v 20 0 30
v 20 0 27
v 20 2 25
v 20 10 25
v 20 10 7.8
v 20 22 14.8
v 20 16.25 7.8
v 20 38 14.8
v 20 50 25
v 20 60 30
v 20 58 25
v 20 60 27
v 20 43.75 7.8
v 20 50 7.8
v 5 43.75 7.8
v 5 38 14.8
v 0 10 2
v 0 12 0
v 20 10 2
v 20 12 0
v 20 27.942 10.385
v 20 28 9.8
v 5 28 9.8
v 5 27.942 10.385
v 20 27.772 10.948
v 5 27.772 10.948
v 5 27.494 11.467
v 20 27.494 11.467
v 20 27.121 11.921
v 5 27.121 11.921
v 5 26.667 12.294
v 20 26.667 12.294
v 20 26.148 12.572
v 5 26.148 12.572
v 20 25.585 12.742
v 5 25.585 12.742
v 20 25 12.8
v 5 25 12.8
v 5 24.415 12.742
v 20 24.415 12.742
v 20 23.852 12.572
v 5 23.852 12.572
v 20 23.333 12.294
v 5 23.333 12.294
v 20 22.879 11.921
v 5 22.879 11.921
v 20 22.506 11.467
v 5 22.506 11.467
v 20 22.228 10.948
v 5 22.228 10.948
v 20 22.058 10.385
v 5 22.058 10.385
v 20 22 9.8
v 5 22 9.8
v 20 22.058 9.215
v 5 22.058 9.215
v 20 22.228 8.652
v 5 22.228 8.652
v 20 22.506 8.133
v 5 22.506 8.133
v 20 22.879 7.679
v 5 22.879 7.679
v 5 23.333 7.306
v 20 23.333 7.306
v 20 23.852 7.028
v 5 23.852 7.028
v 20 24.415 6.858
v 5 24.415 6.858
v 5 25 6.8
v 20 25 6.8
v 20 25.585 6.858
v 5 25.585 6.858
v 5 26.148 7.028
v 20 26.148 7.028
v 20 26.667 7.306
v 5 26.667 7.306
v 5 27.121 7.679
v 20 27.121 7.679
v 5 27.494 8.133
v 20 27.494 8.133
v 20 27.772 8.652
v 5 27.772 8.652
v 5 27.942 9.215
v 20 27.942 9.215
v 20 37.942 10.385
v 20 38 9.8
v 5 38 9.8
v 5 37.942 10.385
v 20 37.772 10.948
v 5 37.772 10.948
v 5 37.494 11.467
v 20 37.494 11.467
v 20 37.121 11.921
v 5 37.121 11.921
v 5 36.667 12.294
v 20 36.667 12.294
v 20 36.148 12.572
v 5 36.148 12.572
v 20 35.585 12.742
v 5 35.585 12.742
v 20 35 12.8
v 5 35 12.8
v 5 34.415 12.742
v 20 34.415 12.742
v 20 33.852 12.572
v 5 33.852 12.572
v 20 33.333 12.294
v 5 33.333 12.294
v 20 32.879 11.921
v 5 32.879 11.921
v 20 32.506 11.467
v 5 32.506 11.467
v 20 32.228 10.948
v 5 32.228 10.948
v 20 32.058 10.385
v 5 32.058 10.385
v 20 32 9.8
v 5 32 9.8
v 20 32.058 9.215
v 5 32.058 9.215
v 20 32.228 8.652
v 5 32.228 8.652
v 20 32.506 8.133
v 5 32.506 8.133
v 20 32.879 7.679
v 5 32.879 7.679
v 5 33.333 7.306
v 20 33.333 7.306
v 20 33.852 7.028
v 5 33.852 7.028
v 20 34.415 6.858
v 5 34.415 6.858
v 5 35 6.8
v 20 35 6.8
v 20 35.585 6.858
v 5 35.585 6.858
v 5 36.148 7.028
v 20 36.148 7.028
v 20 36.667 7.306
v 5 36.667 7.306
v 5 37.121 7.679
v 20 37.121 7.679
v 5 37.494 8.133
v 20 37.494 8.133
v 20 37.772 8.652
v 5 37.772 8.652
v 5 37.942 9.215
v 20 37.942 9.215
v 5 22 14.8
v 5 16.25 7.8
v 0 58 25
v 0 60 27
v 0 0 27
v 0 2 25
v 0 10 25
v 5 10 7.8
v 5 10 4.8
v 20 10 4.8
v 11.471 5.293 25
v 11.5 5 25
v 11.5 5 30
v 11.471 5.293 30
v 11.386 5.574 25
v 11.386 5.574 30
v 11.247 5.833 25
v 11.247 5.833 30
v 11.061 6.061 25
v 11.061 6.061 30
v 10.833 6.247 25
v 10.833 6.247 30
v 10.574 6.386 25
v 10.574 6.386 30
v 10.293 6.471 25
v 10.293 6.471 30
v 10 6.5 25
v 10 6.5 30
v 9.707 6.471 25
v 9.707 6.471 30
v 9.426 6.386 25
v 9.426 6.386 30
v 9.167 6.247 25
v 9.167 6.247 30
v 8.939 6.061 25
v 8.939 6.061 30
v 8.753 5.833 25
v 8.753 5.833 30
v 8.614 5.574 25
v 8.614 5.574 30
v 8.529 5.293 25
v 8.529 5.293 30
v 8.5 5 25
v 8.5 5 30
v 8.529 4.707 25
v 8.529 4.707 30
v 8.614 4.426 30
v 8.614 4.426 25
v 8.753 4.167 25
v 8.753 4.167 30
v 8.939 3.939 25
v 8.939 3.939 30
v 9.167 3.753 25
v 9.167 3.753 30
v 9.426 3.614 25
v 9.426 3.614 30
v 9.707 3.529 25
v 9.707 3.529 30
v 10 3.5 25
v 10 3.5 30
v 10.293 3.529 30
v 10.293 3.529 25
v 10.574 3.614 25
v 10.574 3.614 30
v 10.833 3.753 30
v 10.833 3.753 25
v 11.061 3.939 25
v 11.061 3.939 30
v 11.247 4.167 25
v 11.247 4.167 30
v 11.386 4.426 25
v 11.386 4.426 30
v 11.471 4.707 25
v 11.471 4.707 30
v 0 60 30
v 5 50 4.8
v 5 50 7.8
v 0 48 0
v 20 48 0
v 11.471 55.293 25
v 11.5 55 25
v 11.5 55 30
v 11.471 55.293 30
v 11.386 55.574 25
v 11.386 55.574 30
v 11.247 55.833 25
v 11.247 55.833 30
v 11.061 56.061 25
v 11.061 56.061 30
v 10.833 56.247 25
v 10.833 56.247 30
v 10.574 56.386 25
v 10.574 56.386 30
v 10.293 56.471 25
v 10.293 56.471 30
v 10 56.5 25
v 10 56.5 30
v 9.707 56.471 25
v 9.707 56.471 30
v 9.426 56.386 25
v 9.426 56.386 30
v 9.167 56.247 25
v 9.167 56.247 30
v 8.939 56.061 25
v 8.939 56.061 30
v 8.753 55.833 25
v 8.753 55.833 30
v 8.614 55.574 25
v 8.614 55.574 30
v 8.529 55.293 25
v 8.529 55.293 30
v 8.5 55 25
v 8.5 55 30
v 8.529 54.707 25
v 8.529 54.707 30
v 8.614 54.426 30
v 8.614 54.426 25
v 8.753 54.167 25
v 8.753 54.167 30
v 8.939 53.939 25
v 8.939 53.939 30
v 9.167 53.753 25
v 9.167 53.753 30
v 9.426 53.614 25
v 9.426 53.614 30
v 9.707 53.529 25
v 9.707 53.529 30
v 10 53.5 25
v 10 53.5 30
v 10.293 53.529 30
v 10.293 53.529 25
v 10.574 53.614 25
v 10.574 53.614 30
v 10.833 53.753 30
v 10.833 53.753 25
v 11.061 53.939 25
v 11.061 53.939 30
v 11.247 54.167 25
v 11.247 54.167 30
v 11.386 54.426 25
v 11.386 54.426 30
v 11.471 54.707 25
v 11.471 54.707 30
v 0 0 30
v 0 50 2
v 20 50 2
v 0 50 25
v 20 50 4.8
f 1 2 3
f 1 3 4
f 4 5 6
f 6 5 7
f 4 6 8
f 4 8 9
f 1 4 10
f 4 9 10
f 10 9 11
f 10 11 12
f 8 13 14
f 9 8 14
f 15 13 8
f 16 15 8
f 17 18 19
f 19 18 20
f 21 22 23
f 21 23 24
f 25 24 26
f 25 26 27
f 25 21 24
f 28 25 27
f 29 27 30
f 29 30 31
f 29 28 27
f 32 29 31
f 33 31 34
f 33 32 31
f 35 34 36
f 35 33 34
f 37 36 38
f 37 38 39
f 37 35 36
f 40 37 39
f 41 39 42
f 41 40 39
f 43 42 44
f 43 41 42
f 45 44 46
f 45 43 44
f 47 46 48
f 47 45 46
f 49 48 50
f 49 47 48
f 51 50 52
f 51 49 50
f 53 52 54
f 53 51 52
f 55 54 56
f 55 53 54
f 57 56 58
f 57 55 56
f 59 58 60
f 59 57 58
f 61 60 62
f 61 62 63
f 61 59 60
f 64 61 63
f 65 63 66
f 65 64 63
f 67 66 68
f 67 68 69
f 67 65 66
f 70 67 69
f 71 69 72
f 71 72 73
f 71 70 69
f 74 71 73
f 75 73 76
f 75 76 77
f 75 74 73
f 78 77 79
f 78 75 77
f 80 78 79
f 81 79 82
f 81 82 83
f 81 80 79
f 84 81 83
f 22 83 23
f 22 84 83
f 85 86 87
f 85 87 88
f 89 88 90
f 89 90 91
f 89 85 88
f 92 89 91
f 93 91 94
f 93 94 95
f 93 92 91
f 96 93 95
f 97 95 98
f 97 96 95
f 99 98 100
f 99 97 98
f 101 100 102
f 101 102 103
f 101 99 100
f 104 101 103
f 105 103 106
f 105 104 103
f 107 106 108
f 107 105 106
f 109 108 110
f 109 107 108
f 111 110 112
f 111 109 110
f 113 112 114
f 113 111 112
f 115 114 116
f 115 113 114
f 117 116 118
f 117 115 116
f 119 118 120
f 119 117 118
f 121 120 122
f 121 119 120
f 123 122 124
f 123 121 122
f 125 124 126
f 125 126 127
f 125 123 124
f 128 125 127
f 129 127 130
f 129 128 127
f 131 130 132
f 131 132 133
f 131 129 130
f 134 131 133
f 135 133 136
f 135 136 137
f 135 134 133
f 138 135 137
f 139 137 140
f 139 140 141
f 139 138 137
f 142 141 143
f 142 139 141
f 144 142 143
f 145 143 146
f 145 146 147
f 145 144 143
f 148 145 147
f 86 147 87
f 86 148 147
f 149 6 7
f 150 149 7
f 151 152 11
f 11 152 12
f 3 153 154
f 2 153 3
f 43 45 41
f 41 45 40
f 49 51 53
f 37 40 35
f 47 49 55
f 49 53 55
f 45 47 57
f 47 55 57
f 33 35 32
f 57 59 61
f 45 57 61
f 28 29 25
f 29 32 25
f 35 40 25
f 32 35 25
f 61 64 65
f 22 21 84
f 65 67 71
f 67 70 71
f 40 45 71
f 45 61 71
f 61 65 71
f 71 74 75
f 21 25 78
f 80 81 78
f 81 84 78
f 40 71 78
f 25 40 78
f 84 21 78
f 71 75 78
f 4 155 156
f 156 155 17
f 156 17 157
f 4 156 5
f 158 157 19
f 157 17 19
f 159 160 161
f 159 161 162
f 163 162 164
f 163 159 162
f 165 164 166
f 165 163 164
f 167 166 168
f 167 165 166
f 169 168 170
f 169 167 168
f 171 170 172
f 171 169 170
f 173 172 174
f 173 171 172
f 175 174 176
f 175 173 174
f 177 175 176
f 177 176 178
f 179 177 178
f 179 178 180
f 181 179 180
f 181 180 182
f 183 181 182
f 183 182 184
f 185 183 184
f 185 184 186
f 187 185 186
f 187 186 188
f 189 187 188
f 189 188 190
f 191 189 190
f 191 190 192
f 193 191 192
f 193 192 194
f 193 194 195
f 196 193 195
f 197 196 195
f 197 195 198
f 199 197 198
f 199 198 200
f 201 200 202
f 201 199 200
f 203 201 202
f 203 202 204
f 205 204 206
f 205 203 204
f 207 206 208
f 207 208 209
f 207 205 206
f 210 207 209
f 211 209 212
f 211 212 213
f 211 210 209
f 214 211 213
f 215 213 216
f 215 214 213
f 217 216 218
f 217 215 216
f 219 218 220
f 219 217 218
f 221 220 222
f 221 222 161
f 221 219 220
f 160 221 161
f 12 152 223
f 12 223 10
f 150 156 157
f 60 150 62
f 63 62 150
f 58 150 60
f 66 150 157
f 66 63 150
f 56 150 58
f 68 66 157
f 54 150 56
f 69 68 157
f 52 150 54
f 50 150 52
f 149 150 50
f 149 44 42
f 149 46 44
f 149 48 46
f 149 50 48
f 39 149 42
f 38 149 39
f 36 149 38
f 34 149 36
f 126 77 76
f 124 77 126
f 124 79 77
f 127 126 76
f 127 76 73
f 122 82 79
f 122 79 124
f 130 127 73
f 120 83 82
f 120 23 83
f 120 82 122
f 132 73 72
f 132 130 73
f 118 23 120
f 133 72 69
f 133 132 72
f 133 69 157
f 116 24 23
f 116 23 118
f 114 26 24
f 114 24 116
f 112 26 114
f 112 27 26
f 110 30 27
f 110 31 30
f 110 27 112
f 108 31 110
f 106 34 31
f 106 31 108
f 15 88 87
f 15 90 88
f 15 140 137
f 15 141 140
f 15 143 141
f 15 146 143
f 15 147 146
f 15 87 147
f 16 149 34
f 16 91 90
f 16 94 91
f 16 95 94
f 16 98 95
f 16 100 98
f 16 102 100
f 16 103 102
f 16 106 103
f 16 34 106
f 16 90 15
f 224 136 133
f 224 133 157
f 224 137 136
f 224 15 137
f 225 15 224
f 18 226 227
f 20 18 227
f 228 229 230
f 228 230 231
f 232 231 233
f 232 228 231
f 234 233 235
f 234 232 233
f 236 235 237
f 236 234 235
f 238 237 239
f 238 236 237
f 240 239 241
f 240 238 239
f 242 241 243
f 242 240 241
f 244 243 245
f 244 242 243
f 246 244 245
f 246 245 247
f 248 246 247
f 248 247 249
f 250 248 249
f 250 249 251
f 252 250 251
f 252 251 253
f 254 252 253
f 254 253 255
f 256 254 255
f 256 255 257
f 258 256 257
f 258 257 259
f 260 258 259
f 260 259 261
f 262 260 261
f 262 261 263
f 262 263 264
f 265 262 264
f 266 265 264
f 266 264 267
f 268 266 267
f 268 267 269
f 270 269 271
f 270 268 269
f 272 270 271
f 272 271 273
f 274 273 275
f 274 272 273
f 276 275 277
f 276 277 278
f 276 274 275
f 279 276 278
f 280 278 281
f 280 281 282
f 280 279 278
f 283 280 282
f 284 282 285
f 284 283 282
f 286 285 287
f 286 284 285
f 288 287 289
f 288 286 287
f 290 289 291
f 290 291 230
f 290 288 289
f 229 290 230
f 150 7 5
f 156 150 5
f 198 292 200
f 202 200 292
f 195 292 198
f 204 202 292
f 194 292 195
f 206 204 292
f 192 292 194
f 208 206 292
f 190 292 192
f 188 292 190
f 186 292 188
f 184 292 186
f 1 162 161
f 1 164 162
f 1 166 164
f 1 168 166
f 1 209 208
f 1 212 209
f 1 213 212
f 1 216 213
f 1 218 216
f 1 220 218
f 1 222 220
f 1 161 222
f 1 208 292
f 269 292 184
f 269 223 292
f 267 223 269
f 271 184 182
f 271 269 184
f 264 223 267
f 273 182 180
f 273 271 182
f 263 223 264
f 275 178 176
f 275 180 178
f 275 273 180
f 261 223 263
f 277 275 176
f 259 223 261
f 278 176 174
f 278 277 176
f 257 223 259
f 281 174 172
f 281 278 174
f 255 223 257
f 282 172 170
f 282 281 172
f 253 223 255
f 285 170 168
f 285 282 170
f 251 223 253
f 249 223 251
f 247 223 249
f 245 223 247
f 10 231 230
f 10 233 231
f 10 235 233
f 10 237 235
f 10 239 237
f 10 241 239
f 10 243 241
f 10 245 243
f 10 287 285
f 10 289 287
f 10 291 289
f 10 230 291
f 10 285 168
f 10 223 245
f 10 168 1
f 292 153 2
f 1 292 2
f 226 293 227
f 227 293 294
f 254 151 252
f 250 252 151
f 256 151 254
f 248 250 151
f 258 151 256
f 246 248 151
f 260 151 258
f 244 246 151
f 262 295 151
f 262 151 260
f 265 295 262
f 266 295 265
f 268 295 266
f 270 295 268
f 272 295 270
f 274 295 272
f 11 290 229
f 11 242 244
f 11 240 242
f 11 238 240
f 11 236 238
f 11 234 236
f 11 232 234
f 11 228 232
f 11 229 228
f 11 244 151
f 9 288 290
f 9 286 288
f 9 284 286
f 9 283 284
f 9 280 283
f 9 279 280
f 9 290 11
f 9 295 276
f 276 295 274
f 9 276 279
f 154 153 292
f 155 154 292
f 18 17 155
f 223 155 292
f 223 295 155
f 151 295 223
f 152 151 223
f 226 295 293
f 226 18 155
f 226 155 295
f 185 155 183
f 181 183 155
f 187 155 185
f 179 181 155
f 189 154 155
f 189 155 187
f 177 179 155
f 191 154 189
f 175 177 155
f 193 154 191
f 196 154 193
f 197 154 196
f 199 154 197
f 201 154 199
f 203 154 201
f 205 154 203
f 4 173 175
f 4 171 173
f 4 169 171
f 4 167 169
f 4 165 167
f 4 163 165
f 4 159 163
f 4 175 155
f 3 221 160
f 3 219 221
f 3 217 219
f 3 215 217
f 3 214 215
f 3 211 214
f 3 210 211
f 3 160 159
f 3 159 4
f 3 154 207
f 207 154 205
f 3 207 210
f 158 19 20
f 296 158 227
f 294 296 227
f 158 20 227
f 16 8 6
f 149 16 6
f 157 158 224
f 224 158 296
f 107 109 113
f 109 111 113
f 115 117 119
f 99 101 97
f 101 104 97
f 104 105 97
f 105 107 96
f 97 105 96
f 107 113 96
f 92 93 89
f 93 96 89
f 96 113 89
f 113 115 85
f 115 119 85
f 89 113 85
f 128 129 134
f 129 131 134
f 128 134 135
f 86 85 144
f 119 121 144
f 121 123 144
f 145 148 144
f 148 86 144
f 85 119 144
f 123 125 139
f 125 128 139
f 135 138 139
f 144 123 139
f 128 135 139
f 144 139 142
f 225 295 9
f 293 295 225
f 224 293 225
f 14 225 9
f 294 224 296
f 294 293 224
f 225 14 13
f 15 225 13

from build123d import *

# Parameters (mm, degrees)
SKETCH_W        = 20
SKETCH_H        = 60
SKETCH_R        = 1.5
PAD_DEPTH       = 30
SKETCH001_W     = 20
SKETCH001_H     = 10
POCKET_DEPTH    = 25
SKETCH002_R     = 3
POCKET001_DEPTH = 15
CHAMFER_SIZE    = 2
CHAMFER001_SIZE = 2


with BuildPart() as part:
    # Sketch → Pad (new body)
    with BuildSketch(Plane.XY):
        with Locations((10, 30)):
            Rectangle(SKETCH_W, SKETCH_H)
        with Locations((10, 55)):
            Circle(SKETCH_R, mode=Mode.SUBTRACT)
        with Locations((10, 5)):
            Circle(SKETCH_R, mode=Mode.SUBTRACT)
    extrude(amount=PAD_DEPTH)

    # Sketch001 (on Face7 of Pad) → Pocket (cut)
    with BuildSketch(Plane(origin=(0, 0, 0), x_dir=(1, 0, 0), z_dir=(0, 0, -1))):
        with Locations((10, -5)):
            Rectangle(SKETCH001_W, SKETCH001_H)
        with Locations((10, -55)):
            Rectangle(SKETCH001_W, SKETCH001_H)
    extrude(amount=-POCKET_DEPTH, mode=Mode.SUBTRACT)

    # Sketch002 (on Face3 of Pocket) → Pocket001 (cut)
    with BuildSketch(Plane.YZ.offset(20)):
        Polygon((10, 7.8), (10, 4.8), (50, 4.8), (50, 7.8), (43.75, 7.8), (38, 14.8), (22, 14.8), (16.25, 7.8), align=None)
        with Locations((25, 9.8)):
            Circle(SKETCH002_R, mode=Mode.SUBTRACT)
        with Locations((35, 9.8)):
            Circle(SKETCH002_R, mode=Mode.SUBTRACT)
    extrude(amount=-POCKET001_DEPTH, mode=Mode.SUBTRACT)

    # Chamfer
    chamfer_edges = [part.edges().sort_by_distance(p)[0] for p in [
        (10, 0, 25),
        (10, 60, 25),
    ]]
    chamfer(chamfer_edges, length=CHAMFER_SIZE)

    # Chamfer001
    chamfer001_edges = [part.edges().sort_by_distance(p)[0] for p in [
        (10, 10, 0),
        (10, 50, 0),
    ]]
    chamfer(chamfer001_edges, length=CHAMFER001_SIZE)


solid = part.part
